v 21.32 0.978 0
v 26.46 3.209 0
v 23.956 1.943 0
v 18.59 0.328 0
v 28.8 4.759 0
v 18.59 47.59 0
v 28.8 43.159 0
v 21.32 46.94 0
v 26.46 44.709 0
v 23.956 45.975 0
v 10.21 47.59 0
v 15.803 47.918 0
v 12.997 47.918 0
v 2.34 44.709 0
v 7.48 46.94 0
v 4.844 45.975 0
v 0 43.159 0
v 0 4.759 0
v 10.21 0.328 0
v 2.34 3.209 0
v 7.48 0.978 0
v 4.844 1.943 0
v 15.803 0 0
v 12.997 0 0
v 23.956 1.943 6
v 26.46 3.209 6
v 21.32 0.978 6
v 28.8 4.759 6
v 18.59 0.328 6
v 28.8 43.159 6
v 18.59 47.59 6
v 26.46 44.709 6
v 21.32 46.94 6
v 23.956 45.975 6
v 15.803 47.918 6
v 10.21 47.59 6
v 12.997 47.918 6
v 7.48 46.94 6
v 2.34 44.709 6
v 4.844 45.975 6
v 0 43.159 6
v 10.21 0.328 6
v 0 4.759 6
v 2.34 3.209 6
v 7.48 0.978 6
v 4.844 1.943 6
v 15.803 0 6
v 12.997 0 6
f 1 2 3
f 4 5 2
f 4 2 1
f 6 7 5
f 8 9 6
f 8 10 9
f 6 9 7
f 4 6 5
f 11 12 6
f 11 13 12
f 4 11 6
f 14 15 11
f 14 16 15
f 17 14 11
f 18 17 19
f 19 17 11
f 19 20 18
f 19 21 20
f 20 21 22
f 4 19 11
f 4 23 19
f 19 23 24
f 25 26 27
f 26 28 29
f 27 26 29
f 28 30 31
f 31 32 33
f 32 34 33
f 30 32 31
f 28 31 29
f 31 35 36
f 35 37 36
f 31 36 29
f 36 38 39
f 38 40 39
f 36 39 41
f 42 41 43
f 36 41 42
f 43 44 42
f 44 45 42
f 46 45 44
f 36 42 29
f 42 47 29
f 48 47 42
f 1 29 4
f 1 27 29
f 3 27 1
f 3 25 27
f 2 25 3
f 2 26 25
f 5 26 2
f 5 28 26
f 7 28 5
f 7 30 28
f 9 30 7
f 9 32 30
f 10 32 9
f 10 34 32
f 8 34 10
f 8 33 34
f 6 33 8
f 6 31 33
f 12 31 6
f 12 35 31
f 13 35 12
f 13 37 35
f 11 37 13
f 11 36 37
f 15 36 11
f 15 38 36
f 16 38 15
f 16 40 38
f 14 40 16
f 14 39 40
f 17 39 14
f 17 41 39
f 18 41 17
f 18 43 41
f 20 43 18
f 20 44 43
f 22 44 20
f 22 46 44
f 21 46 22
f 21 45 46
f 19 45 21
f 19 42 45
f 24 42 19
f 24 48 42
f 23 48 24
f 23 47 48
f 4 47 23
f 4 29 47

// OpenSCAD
$fn = 32;

// ----------------------------------------------------------------------
// Eccentric disc: double_d, 6 mm thick
// ----------------------------------------------------------------------

// --- parameters (mm) ---
profile_height = 6;       // extrusion height
profile_points = 24;      // points of the closed outline

profile = [[28.8, 43.159], [26.46, 44.709], [23.956, 45.975], [21.32, 46.94], [18.59, 47.59], [15.803, 47.918], [12.997, 47.918], [10.21, 47.59], [7.48, 46.94], [4.844, 45.975], [2.34, 44.709], [0, 43.159], [0, 4.759], [2.34, 3.209], [4.844, 1.943], [7.48, 0.978], [10.21, 0.328], [12.997, 0], [15.803, 0], [18.59, 0.328], [21.32, 0.978], [23.956, 1.943], [26.46, 3.209], [28.8, 4.759]];  // single closed polygon, 24 points, counter clockwise

// --- the one profile operation ---
linear_extrude(height = profile_height) polygon(points = profile);
